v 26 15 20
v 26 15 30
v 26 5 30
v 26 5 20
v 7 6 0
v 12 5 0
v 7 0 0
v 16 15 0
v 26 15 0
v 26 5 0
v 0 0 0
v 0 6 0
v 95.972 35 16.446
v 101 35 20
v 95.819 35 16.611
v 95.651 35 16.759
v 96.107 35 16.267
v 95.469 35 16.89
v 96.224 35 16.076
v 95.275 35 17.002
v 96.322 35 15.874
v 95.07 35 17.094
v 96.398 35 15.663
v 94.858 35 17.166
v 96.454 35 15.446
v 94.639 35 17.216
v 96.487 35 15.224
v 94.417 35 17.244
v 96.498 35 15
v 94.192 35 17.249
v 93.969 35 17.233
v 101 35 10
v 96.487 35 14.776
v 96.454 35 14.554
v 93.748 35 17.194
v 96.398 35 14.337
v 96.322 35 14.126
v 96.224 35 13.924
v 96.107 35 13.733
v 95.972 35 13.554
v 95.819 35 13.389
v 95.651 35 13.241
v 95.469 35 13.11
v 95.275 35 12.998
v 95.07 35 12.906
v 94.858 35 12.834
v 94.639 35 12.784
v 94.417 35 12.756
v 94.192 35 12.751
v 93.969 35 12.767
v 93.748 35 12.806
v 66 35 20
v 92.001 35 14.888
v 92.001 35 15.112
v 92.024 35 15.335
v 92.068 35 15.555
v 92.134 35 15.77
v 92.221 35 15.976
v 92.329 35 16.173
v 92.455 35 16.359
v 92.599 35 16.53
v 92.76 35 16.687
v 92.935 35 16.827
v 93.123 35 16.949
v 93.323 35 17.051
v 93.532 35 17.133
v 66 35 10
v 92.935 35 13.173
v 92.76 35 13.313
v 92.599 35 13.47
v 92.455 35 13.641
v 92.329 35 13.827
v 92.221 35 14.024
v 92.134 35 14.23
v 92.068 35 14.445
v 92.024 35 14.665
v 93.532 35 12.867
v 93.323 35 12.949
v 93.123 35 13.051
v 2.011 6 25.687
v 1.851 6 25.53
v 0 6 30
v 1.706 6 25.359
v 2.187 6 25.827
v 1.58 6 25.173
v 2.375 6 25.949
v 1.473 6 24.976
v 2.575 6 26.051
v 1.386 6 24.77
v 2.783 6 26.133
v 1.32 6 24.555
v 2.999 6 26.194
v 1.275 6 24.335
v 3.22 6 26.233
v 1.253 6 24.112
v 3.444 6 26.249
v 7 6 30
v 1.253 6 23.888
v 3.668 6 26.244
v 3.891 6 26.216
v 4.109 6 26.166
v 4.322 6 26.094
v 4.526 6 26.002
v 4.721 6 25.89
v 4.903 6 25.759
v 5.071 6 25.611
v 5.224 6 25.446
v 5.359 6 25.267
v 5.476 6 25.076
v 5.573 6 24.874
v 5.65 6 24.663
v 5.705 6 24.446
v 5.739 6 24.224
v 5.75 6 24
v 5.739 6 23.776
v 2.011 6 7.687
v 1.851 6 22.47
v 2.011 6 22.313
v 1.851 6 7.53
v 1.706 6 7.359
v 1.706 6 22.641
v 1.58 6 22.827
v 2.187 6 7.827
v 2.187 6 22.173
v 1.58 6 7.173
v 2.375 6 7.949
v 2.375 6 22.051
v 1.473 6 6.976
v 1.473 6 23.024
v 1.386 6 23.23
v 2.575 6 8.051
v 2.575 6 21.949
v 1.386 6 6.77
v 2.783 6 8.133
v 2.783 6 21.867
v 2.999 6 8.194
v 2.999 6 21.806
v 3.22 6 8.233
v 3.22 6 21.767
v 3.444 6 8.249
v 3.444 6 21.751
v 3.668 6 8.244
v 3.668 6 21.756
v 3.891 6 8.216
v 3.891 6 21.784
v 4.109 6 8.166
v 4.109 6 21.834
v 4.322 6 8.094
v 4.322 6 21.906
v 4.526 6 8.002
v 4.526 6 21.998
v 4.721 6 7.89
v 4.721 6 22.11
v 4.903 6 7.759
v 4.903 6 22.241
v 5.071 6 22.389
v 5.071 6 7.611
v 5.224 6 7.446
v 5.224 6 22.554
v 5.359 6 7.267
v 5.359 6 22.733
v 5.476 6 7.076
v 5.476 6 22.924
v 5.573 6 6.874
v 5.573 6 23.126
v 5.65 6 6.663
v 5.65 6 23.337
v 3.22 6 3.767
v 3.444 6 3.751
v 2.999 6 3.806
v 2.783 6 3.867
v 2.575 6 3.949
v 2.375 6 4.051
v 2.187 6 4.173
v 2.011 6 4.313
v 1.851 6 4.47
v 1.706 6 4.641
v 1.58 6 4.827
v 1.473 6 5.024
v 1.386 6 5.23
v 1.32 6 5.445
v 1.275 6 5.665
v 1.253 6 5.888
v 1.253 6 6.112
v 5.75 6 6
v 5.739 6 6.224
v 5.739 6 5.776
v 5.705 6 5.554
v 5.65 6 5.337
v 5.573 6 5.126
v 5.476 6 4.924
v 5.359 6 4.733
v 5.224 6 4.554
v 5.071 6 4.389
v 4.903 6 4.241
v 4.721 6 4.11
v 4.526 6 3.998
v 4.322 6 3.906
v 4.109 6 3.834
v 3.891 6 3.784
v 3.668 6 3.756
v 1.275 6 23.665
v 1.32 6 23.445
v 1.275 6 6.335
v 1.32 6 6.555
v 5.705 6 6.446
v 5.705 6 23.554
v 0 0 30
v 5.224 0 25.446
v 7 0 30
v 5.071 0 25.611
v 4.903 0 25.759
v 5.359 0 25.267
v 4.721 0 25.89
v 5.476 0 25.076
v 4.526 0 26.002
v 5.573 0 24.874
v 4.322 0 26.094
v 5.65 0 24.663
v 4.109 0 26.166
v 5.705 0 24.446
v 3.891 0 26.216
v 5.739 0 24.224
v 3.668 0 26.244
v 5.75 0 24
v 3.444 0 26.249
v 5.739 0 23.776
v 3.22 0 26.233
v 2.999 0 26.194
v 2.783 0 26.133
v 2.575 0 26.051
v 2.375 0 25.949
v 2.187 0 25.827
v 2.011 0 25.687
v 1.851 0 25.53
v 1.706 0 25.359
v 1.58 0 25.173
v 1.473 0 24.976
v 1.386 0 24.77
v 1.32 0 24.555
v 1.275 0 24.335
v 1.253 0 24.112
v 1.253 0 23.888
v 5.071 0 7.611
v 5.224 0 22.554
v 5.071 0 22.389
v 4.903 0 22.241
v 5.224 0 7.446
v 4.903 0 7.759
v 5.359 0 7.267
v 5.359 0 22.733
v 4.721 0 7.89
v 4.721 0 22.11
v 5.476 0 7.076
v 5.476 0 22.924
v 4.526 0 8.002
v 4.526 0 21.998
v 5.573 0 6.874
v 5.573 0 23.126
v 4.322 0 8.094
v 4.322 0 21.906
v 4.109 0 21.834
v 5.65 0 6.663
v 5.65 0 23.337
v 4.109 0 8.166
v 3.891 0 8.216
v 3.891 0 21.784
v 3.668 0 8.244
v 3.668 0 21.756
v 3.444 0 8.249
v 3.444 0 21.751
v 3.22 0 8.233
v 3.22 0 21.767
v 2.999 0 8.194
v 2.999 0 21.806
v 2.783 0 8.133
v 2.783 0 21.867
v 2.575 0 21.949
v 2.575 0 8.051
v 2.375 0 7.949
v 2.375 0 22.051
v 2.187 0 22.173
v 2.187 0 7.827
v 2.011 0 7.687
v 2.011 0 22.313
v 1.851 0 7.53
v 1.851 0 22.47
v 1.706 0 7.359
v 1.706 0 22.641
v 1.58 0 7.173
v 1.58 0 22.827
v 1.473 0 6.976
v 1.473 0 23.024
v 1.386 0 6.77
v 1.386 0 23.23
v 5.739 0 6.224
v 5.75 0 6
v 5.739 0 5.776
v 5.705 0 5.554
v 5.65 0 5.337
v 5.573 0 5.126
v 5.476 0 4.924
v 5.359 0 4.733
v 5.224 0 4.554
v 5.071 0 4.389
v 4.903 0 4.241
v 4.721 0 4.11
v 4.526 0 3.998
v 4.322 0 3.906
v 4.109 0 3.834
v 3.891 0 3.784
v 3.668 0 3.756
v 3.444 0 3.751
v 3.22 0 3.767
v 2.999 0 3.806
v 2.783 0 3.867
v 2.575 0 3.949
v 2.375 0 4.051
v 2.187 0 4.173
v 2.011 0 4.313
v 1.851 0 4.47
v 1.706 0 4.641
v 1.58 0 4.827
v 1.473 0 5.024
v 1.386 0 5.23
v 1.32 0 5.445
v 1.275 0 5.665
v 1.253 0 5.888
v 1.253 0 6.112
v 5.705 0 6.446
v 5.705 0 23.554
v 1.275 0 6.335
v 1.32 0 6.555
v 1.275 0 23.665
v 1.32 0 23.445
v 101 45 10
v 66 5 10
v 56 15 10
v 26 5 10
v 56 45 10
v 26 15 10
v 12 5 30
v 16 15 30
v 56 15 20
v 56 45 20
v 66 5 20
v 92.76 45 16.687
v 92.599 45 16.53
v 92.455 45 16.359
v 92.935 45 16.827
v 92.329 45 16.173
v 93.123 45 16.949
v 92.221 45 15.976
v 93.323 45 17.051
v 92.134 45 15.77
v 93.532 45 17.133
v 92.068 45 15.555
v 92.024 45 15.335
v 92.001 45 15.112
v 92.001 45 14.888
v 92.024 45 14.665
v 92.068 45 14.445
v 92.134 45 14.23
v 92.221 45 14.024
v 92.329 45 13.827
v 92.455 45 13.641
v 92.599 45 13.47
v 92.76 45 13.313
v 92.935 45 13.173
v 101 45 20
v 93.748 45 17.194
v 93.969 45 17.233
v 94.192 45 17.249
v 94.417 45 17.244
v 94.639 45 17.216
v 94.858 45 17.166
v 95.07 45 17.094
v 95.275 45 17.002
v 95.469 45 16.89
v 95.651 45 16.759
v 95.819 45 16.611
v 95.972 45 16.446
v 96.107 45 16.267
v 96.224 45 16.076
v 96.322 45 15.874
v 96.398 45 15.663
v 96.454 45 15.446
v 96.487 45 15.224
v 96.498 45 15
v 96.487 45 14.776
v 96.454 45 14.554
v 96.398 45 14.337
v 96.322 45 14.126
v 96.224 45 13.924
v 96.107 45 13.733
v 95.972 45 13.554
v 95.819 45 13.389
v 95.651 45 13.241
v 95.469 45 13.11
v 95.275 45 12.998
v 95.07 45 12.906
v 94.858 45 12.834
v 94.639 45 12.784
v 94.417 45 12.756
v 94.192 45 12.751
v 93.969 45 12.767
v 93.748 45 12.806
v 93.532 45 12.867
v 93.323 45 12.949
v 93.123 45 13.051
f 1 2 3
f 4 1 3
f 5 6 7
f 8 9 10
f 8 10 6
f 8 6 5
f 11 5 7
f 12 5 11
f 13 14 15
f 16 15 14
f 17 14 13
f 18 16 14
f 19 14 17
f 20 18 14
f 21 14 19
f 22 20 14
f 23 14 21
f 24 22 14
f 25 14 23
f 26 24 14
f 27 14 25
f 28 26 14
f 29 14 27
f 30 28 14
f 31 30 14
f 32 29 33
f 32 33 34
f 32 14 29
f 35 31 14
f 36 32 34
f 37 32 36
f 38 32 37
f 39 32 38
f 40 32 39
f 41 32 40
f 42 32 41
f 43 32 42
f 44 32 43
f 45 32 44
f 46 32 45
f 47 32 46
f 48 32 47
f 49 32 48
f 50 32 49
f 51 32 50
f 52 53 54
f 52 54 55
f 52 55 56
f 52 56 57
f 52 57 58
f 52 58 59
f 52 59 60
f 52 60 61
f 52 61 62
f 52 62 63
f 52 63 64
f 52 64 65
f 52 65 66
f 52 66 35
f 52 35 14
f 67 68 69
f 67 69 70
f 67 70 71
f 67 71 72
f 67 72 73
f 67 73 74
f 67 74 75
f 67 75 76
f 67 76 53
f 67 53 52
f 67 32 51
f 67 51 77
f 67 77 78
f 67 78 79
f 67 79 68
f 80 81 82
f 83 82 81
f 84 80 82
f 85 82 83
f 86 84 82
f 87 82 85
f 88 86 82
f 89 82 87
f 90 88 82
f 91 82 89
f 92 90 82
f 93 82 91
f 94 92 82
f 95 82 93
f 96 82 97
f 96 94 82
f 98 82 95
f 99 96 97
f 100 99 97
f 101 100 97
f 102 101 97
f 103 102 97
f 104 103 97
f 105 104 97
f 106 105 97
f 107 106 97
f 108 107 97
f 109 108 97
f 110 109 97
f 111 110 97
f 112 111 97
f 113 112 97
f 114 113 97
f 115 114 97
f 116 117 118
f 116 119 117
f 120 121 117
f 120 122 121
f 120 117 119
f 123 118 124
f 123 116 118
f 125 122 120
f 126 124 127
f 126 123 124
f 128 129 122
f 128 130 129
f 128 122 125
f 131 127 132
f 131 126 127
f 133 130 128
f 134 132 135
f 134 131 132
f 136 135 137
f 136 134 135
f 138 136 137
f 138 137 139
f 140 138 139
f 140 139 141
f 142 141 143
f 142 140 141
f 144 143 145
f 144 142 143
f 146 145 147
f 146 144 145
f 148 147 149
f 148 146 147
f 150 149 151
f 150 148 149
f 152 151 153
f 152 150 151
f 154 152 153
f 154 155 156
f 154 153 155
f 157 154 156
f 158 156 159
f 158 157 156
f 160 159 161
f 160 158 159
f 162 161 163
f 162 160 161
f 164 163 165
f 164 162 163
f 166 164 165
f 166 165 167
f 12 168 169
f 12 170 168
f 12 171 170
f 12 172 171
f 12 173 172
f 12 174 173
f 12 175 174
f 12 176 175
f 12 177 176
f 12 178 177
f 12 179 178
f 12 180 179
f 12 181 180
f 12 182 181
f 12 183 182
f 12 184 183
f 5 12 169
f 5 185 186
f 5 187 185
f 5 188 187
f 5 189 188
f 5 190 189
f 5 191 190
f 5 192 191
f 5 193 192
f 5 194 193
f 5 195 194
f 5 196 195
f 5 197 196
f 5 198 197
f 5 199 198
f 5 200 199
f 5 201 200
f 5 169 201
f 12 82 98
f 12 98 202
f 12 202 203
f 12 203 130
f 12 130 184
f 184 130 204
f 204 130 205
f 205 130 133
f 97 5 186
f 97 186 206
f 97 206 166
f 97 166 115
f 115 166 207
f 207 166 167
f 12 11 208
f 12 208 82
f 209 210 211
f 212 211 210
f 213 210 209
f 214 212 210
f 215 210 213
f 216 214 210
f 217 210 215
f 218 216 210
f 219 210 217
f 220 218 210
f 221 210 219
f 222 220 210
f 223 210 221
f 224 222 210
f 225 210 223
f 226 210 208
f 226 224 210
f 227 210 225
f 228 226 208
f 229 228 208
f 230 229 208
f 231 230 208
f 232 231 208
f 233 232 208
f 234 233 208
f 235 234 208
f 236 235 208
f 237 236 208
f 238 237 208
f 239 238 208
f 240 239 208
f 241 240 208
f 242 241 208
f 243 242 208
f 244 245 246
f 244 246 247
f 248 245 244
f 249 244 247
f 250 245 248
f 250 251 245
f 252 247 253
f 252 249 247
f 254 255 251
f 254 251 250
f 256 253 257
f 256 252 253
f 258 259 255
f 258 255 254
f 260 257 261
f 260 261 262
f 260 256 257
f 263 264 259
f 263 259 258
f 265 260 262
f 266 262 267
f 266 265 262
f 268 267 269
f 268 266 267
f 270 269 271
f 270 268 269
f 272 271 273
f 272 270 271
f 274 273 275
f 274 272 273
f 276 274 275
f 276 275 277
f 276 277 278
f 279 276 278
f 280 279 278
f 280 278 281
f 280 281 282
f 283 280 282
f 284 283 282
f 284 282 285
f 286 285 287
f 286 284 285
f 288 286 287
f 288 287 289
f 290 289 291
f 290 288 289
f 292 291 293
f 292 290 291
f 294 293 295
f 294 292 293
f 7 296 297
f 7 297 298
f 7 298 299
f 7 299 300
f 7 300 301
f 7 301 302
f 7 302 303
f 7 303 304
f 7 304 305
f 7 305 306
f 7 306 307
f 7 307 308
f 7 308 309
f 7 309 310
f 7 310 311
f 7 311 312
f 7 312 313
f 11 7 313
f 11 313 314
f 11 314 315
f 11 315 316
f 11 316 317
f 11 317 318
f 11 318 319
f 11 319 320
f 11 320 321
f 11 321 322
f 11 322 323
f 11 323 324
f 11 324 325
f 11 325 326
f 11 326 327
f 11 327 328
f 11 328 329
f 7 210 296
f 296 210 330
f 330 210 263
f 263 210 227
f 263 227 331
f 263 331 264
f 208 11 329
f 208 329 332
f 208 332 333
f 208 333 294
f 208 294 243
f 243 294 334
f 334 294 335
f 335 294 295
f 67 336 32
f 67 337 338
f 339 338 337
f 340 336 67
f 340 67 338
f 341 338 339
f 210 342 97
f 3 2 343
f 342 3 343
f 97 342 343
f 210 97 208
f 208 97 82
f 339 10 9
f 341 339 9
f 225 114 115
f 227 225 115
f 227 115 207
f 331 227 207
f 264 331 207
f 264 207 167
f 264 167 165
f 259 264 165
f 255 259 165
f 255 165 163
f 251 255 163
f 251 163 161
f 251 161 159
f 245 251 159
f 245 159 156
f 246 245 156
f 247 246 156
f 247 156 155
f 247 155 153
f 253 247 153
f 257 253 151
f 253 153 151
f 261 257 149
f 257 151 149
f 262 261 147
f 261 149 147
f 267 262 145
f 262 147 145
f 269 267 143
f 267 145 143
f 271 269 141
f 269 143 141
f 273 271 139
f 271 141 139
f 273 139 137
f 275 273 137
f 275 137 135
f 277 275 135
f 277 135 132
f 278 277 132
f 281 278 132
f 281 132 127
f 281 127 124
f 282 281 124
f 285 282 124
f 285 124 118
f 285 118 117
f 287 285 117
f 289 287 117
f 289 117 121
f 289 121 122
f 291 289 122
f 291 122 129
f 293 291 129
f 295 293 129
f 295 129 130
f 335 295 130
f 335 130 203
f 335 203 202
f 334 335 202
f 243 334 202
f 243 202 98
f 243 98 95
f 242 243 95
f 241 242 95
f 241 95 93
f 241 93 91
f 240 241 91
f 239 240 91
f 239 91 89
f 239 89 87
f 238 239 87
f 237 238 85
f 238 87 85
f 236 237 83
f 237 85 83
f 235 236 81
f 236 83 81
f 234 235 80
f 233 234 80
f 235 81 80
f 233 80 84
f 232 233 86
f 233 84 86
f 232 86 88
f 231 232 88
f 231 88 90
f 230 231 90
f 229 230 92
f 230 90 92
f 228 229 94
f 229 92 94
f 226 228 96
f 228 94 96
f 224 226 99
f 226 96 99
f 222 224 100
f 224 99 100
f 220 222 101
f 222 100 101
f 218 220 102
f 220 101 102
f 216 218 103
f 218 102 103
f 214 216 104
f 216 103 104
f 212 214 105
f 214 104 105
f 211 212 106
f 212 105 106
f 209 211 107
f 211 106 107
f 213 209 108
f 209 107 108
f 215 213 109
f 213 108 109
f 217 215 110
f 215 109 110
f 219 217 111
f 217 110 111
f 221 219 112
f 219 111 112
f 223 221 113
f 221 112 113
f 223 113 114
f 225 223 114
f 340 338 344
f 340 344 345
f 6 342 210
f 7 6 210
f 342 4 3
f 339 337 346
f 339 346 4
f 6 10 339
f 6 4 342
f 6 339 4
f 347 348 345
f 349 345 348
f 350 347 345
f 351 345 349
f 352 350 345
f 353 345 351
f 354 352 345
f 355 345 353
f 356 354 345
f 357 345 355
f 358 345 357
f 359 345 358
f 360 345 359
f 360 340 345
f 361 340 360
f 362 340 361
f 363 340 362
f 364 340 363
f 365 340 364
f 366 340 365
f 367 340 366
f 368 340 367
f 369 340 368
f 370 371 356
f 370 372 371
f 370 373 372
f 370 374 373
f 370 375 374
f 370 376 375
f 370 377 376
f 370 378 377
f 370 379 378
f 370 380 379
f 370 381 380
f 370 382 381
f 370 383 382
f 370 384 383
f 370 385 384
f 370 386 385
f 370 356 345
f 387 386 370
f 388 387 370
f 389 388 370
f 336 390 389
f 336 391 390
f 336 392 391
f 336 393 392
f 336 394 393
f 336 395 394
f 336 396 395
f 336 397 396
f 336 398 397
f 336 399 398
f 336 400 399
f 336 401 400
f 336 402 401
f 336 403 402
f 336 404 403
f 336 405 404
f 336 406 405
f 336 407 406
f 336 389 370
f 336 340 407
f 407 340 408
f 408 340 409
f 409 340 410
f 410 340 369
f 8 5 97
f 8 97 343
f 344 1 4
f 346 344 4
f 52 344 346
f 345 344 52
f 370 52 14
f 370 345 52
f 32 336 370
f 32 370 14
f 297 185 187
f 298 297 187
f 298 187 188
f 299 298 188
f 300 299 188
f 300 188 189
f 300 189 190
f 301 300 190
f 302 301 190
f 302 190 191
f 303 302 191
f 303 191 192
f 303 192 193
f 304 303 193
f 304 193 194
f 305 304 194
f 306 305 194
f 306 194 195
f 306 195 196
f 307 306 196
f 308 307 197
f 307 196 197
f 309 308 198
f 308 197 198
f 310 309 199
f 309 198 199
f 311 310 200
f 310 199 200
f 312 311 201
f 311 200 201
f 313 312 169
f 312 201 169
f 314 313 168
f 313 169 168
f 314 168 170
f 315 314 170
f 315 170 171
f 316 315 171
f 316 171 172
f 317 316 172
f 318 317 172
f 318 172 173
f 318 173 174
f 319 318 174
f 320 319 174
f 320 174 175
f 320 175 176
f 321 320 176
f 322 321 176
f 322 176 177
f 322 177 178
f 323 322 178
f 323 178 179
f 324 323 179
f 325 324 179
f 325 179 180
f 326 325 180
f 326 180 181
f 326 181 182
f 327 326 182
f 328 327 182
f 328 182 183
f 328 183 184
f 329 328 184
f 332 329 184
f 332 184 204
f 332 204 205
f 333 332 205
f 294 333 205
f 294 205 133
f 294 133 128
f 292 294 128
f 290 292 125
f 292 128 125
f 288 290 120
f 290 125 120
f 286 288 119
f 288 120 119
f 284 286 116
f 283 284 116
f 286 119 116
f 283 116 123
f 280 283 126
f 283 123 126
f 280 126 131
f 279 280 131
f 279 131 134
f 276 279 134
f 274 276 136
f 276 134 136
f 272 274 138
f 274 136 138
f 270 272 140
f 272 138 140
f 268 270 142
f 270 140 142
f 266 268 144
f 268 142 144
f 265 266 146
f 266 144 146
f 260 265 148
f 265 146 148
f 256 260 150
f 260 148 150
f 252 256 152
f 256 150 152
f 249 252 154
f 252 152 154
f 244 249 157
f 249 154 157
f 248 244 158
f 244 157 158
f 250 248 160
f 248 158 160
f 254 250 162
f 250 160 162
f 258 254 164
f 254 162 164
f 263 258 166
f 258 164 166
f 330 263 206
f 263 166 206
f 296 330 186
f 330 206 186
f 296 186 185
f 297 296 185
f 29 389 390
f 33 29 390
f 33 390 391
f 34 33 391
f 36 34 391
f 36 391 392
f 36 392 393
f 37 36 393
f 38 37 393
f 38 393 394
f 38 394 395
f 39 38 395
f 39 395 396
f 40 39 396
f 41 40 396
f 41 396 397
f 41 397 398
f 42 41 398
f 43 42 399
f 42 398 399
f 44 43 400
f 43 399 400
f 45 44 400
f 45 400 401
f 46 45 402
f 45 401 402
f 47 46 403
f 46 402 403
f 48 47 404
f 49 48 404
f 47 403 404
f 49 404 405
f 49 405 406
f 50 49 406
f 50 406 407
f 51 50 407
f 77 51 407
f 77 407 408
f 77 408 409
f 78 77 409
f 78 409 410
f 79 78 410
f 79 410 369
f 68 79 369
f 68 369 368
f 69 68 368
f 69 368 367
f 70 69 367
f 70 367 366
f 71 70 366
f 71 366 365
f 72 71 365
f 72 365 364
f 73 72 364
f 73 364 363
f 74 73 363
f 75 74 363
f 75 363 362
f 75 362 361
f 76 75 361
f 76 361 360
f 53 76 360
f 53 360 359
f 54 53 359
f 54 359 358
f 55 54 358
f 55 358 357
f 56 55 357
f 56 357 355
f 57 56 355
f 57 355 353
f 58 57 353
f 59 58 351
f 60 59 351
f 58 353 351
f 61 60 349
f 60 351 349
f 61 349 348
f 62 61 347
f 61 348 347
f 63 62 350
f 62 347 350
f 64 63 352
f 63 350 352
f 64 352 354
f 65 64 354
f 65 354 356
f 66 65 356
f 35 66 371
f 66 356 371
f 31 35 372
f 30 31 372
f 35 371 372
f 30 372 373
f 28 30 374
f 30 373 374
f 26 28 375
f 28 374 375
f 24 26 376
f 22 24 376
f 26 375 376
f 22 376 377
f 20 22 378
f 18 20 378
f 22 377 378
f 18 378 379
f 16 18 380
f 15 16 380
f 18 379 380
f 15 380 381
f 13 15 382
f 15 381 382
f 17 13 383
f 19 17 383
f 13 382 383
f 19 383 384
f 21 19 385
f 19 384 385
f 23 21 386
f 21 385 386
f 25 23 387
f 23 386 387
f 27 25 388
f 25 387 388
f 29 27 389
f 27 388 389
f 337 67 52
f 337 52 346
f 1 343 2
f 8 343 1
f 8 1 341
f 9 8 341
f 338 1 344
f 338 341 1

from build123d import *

# Parameters (mm, degrees)
BOSS_EXTRUDE1_DEPTH = 30
CUT_EXTRUDE1_DEPTH  = 10
CUT_EXTRUDE2_DEPTH  = 10
SKETCH5_R           = 2.25
CUT_EXTRUDE3_DEPTH  = 46
SKETCH6_R           = 2.25
CUT_EXTRUDE4_DEPTH  = 10


with BuildPart() as part:
    # Sketch1 → Boss-Extrude1 (new body)
    with BuildSketch(Plane.XY):
        Polygon((0, 0), (0, 6), (7, 6), (16, 15), (56, 15), (56, 45), (101, 45), (101, 35), (66, 35), (66, 5), (12, 5), (7, 0), align=None)
    extrude(amount=BOSS_EXTRUDE1_DEPTH)

    # Sketch2 → Cut-Extrude1 (cut)
    with BuildSketch(Plane.XY.offset(30)):
        Polygon((26, 15), (26, 5), (66, 5), (66, 35), (101, 35), (101, 45), (56, 45), (56, 15), align=None)
    extrude(amount=-CUT_EXTRUDE1_DEPTH, mode=Mode.SUBTRACT)

    # Sketch4 → Cut-Extrude2 (cut)
    with BuildSketch(Plane(origin=(0, 0, 0), x_dir=(-1, 0, 0), z_dir=(0, 0, -1))):
        Polygon((-66, 5), (-26, 5), (-26, 15), (-56, 15), (-56, 45), (-101, 45), (-101, 35), (-66, 35), align=None)
    extrude(amount=-CUT_EXTRUDE2_DEPTH, mode=Mode.SUBTRACT)

    # Sketch5 → Cut-Extrude3 (cut, through all)
    with BuildSketch(Plane(origin=(0, 45, 0), x_dir=(1, 0, 0), z_dir=(0, 1, 0))):
        with Locations((94.248435015, -15)):
            Circle(SKETCH5_R)
    extrude(amount=-CUT_EXTRUDE3_DEPTH, mode=Mode.SUBTRACT)

    # Sketch6 → Cut-Extrude4 (cut)
    with BuildSketch(Plane(origin=(0, 6, 0), x_dir=(1, 0, 0), z_dir=(0, 1, 0))):
        with Locations((3.5, -6)):
            Circle(SKETCH6_R)
        with Locations((3.5, -24)):
            Circle(SKETCH6_R)
    extrude(amount=-CUT_EXTRUDE4_DEPTH, mode=Mode.SUBTRACT)


solid = part.part
